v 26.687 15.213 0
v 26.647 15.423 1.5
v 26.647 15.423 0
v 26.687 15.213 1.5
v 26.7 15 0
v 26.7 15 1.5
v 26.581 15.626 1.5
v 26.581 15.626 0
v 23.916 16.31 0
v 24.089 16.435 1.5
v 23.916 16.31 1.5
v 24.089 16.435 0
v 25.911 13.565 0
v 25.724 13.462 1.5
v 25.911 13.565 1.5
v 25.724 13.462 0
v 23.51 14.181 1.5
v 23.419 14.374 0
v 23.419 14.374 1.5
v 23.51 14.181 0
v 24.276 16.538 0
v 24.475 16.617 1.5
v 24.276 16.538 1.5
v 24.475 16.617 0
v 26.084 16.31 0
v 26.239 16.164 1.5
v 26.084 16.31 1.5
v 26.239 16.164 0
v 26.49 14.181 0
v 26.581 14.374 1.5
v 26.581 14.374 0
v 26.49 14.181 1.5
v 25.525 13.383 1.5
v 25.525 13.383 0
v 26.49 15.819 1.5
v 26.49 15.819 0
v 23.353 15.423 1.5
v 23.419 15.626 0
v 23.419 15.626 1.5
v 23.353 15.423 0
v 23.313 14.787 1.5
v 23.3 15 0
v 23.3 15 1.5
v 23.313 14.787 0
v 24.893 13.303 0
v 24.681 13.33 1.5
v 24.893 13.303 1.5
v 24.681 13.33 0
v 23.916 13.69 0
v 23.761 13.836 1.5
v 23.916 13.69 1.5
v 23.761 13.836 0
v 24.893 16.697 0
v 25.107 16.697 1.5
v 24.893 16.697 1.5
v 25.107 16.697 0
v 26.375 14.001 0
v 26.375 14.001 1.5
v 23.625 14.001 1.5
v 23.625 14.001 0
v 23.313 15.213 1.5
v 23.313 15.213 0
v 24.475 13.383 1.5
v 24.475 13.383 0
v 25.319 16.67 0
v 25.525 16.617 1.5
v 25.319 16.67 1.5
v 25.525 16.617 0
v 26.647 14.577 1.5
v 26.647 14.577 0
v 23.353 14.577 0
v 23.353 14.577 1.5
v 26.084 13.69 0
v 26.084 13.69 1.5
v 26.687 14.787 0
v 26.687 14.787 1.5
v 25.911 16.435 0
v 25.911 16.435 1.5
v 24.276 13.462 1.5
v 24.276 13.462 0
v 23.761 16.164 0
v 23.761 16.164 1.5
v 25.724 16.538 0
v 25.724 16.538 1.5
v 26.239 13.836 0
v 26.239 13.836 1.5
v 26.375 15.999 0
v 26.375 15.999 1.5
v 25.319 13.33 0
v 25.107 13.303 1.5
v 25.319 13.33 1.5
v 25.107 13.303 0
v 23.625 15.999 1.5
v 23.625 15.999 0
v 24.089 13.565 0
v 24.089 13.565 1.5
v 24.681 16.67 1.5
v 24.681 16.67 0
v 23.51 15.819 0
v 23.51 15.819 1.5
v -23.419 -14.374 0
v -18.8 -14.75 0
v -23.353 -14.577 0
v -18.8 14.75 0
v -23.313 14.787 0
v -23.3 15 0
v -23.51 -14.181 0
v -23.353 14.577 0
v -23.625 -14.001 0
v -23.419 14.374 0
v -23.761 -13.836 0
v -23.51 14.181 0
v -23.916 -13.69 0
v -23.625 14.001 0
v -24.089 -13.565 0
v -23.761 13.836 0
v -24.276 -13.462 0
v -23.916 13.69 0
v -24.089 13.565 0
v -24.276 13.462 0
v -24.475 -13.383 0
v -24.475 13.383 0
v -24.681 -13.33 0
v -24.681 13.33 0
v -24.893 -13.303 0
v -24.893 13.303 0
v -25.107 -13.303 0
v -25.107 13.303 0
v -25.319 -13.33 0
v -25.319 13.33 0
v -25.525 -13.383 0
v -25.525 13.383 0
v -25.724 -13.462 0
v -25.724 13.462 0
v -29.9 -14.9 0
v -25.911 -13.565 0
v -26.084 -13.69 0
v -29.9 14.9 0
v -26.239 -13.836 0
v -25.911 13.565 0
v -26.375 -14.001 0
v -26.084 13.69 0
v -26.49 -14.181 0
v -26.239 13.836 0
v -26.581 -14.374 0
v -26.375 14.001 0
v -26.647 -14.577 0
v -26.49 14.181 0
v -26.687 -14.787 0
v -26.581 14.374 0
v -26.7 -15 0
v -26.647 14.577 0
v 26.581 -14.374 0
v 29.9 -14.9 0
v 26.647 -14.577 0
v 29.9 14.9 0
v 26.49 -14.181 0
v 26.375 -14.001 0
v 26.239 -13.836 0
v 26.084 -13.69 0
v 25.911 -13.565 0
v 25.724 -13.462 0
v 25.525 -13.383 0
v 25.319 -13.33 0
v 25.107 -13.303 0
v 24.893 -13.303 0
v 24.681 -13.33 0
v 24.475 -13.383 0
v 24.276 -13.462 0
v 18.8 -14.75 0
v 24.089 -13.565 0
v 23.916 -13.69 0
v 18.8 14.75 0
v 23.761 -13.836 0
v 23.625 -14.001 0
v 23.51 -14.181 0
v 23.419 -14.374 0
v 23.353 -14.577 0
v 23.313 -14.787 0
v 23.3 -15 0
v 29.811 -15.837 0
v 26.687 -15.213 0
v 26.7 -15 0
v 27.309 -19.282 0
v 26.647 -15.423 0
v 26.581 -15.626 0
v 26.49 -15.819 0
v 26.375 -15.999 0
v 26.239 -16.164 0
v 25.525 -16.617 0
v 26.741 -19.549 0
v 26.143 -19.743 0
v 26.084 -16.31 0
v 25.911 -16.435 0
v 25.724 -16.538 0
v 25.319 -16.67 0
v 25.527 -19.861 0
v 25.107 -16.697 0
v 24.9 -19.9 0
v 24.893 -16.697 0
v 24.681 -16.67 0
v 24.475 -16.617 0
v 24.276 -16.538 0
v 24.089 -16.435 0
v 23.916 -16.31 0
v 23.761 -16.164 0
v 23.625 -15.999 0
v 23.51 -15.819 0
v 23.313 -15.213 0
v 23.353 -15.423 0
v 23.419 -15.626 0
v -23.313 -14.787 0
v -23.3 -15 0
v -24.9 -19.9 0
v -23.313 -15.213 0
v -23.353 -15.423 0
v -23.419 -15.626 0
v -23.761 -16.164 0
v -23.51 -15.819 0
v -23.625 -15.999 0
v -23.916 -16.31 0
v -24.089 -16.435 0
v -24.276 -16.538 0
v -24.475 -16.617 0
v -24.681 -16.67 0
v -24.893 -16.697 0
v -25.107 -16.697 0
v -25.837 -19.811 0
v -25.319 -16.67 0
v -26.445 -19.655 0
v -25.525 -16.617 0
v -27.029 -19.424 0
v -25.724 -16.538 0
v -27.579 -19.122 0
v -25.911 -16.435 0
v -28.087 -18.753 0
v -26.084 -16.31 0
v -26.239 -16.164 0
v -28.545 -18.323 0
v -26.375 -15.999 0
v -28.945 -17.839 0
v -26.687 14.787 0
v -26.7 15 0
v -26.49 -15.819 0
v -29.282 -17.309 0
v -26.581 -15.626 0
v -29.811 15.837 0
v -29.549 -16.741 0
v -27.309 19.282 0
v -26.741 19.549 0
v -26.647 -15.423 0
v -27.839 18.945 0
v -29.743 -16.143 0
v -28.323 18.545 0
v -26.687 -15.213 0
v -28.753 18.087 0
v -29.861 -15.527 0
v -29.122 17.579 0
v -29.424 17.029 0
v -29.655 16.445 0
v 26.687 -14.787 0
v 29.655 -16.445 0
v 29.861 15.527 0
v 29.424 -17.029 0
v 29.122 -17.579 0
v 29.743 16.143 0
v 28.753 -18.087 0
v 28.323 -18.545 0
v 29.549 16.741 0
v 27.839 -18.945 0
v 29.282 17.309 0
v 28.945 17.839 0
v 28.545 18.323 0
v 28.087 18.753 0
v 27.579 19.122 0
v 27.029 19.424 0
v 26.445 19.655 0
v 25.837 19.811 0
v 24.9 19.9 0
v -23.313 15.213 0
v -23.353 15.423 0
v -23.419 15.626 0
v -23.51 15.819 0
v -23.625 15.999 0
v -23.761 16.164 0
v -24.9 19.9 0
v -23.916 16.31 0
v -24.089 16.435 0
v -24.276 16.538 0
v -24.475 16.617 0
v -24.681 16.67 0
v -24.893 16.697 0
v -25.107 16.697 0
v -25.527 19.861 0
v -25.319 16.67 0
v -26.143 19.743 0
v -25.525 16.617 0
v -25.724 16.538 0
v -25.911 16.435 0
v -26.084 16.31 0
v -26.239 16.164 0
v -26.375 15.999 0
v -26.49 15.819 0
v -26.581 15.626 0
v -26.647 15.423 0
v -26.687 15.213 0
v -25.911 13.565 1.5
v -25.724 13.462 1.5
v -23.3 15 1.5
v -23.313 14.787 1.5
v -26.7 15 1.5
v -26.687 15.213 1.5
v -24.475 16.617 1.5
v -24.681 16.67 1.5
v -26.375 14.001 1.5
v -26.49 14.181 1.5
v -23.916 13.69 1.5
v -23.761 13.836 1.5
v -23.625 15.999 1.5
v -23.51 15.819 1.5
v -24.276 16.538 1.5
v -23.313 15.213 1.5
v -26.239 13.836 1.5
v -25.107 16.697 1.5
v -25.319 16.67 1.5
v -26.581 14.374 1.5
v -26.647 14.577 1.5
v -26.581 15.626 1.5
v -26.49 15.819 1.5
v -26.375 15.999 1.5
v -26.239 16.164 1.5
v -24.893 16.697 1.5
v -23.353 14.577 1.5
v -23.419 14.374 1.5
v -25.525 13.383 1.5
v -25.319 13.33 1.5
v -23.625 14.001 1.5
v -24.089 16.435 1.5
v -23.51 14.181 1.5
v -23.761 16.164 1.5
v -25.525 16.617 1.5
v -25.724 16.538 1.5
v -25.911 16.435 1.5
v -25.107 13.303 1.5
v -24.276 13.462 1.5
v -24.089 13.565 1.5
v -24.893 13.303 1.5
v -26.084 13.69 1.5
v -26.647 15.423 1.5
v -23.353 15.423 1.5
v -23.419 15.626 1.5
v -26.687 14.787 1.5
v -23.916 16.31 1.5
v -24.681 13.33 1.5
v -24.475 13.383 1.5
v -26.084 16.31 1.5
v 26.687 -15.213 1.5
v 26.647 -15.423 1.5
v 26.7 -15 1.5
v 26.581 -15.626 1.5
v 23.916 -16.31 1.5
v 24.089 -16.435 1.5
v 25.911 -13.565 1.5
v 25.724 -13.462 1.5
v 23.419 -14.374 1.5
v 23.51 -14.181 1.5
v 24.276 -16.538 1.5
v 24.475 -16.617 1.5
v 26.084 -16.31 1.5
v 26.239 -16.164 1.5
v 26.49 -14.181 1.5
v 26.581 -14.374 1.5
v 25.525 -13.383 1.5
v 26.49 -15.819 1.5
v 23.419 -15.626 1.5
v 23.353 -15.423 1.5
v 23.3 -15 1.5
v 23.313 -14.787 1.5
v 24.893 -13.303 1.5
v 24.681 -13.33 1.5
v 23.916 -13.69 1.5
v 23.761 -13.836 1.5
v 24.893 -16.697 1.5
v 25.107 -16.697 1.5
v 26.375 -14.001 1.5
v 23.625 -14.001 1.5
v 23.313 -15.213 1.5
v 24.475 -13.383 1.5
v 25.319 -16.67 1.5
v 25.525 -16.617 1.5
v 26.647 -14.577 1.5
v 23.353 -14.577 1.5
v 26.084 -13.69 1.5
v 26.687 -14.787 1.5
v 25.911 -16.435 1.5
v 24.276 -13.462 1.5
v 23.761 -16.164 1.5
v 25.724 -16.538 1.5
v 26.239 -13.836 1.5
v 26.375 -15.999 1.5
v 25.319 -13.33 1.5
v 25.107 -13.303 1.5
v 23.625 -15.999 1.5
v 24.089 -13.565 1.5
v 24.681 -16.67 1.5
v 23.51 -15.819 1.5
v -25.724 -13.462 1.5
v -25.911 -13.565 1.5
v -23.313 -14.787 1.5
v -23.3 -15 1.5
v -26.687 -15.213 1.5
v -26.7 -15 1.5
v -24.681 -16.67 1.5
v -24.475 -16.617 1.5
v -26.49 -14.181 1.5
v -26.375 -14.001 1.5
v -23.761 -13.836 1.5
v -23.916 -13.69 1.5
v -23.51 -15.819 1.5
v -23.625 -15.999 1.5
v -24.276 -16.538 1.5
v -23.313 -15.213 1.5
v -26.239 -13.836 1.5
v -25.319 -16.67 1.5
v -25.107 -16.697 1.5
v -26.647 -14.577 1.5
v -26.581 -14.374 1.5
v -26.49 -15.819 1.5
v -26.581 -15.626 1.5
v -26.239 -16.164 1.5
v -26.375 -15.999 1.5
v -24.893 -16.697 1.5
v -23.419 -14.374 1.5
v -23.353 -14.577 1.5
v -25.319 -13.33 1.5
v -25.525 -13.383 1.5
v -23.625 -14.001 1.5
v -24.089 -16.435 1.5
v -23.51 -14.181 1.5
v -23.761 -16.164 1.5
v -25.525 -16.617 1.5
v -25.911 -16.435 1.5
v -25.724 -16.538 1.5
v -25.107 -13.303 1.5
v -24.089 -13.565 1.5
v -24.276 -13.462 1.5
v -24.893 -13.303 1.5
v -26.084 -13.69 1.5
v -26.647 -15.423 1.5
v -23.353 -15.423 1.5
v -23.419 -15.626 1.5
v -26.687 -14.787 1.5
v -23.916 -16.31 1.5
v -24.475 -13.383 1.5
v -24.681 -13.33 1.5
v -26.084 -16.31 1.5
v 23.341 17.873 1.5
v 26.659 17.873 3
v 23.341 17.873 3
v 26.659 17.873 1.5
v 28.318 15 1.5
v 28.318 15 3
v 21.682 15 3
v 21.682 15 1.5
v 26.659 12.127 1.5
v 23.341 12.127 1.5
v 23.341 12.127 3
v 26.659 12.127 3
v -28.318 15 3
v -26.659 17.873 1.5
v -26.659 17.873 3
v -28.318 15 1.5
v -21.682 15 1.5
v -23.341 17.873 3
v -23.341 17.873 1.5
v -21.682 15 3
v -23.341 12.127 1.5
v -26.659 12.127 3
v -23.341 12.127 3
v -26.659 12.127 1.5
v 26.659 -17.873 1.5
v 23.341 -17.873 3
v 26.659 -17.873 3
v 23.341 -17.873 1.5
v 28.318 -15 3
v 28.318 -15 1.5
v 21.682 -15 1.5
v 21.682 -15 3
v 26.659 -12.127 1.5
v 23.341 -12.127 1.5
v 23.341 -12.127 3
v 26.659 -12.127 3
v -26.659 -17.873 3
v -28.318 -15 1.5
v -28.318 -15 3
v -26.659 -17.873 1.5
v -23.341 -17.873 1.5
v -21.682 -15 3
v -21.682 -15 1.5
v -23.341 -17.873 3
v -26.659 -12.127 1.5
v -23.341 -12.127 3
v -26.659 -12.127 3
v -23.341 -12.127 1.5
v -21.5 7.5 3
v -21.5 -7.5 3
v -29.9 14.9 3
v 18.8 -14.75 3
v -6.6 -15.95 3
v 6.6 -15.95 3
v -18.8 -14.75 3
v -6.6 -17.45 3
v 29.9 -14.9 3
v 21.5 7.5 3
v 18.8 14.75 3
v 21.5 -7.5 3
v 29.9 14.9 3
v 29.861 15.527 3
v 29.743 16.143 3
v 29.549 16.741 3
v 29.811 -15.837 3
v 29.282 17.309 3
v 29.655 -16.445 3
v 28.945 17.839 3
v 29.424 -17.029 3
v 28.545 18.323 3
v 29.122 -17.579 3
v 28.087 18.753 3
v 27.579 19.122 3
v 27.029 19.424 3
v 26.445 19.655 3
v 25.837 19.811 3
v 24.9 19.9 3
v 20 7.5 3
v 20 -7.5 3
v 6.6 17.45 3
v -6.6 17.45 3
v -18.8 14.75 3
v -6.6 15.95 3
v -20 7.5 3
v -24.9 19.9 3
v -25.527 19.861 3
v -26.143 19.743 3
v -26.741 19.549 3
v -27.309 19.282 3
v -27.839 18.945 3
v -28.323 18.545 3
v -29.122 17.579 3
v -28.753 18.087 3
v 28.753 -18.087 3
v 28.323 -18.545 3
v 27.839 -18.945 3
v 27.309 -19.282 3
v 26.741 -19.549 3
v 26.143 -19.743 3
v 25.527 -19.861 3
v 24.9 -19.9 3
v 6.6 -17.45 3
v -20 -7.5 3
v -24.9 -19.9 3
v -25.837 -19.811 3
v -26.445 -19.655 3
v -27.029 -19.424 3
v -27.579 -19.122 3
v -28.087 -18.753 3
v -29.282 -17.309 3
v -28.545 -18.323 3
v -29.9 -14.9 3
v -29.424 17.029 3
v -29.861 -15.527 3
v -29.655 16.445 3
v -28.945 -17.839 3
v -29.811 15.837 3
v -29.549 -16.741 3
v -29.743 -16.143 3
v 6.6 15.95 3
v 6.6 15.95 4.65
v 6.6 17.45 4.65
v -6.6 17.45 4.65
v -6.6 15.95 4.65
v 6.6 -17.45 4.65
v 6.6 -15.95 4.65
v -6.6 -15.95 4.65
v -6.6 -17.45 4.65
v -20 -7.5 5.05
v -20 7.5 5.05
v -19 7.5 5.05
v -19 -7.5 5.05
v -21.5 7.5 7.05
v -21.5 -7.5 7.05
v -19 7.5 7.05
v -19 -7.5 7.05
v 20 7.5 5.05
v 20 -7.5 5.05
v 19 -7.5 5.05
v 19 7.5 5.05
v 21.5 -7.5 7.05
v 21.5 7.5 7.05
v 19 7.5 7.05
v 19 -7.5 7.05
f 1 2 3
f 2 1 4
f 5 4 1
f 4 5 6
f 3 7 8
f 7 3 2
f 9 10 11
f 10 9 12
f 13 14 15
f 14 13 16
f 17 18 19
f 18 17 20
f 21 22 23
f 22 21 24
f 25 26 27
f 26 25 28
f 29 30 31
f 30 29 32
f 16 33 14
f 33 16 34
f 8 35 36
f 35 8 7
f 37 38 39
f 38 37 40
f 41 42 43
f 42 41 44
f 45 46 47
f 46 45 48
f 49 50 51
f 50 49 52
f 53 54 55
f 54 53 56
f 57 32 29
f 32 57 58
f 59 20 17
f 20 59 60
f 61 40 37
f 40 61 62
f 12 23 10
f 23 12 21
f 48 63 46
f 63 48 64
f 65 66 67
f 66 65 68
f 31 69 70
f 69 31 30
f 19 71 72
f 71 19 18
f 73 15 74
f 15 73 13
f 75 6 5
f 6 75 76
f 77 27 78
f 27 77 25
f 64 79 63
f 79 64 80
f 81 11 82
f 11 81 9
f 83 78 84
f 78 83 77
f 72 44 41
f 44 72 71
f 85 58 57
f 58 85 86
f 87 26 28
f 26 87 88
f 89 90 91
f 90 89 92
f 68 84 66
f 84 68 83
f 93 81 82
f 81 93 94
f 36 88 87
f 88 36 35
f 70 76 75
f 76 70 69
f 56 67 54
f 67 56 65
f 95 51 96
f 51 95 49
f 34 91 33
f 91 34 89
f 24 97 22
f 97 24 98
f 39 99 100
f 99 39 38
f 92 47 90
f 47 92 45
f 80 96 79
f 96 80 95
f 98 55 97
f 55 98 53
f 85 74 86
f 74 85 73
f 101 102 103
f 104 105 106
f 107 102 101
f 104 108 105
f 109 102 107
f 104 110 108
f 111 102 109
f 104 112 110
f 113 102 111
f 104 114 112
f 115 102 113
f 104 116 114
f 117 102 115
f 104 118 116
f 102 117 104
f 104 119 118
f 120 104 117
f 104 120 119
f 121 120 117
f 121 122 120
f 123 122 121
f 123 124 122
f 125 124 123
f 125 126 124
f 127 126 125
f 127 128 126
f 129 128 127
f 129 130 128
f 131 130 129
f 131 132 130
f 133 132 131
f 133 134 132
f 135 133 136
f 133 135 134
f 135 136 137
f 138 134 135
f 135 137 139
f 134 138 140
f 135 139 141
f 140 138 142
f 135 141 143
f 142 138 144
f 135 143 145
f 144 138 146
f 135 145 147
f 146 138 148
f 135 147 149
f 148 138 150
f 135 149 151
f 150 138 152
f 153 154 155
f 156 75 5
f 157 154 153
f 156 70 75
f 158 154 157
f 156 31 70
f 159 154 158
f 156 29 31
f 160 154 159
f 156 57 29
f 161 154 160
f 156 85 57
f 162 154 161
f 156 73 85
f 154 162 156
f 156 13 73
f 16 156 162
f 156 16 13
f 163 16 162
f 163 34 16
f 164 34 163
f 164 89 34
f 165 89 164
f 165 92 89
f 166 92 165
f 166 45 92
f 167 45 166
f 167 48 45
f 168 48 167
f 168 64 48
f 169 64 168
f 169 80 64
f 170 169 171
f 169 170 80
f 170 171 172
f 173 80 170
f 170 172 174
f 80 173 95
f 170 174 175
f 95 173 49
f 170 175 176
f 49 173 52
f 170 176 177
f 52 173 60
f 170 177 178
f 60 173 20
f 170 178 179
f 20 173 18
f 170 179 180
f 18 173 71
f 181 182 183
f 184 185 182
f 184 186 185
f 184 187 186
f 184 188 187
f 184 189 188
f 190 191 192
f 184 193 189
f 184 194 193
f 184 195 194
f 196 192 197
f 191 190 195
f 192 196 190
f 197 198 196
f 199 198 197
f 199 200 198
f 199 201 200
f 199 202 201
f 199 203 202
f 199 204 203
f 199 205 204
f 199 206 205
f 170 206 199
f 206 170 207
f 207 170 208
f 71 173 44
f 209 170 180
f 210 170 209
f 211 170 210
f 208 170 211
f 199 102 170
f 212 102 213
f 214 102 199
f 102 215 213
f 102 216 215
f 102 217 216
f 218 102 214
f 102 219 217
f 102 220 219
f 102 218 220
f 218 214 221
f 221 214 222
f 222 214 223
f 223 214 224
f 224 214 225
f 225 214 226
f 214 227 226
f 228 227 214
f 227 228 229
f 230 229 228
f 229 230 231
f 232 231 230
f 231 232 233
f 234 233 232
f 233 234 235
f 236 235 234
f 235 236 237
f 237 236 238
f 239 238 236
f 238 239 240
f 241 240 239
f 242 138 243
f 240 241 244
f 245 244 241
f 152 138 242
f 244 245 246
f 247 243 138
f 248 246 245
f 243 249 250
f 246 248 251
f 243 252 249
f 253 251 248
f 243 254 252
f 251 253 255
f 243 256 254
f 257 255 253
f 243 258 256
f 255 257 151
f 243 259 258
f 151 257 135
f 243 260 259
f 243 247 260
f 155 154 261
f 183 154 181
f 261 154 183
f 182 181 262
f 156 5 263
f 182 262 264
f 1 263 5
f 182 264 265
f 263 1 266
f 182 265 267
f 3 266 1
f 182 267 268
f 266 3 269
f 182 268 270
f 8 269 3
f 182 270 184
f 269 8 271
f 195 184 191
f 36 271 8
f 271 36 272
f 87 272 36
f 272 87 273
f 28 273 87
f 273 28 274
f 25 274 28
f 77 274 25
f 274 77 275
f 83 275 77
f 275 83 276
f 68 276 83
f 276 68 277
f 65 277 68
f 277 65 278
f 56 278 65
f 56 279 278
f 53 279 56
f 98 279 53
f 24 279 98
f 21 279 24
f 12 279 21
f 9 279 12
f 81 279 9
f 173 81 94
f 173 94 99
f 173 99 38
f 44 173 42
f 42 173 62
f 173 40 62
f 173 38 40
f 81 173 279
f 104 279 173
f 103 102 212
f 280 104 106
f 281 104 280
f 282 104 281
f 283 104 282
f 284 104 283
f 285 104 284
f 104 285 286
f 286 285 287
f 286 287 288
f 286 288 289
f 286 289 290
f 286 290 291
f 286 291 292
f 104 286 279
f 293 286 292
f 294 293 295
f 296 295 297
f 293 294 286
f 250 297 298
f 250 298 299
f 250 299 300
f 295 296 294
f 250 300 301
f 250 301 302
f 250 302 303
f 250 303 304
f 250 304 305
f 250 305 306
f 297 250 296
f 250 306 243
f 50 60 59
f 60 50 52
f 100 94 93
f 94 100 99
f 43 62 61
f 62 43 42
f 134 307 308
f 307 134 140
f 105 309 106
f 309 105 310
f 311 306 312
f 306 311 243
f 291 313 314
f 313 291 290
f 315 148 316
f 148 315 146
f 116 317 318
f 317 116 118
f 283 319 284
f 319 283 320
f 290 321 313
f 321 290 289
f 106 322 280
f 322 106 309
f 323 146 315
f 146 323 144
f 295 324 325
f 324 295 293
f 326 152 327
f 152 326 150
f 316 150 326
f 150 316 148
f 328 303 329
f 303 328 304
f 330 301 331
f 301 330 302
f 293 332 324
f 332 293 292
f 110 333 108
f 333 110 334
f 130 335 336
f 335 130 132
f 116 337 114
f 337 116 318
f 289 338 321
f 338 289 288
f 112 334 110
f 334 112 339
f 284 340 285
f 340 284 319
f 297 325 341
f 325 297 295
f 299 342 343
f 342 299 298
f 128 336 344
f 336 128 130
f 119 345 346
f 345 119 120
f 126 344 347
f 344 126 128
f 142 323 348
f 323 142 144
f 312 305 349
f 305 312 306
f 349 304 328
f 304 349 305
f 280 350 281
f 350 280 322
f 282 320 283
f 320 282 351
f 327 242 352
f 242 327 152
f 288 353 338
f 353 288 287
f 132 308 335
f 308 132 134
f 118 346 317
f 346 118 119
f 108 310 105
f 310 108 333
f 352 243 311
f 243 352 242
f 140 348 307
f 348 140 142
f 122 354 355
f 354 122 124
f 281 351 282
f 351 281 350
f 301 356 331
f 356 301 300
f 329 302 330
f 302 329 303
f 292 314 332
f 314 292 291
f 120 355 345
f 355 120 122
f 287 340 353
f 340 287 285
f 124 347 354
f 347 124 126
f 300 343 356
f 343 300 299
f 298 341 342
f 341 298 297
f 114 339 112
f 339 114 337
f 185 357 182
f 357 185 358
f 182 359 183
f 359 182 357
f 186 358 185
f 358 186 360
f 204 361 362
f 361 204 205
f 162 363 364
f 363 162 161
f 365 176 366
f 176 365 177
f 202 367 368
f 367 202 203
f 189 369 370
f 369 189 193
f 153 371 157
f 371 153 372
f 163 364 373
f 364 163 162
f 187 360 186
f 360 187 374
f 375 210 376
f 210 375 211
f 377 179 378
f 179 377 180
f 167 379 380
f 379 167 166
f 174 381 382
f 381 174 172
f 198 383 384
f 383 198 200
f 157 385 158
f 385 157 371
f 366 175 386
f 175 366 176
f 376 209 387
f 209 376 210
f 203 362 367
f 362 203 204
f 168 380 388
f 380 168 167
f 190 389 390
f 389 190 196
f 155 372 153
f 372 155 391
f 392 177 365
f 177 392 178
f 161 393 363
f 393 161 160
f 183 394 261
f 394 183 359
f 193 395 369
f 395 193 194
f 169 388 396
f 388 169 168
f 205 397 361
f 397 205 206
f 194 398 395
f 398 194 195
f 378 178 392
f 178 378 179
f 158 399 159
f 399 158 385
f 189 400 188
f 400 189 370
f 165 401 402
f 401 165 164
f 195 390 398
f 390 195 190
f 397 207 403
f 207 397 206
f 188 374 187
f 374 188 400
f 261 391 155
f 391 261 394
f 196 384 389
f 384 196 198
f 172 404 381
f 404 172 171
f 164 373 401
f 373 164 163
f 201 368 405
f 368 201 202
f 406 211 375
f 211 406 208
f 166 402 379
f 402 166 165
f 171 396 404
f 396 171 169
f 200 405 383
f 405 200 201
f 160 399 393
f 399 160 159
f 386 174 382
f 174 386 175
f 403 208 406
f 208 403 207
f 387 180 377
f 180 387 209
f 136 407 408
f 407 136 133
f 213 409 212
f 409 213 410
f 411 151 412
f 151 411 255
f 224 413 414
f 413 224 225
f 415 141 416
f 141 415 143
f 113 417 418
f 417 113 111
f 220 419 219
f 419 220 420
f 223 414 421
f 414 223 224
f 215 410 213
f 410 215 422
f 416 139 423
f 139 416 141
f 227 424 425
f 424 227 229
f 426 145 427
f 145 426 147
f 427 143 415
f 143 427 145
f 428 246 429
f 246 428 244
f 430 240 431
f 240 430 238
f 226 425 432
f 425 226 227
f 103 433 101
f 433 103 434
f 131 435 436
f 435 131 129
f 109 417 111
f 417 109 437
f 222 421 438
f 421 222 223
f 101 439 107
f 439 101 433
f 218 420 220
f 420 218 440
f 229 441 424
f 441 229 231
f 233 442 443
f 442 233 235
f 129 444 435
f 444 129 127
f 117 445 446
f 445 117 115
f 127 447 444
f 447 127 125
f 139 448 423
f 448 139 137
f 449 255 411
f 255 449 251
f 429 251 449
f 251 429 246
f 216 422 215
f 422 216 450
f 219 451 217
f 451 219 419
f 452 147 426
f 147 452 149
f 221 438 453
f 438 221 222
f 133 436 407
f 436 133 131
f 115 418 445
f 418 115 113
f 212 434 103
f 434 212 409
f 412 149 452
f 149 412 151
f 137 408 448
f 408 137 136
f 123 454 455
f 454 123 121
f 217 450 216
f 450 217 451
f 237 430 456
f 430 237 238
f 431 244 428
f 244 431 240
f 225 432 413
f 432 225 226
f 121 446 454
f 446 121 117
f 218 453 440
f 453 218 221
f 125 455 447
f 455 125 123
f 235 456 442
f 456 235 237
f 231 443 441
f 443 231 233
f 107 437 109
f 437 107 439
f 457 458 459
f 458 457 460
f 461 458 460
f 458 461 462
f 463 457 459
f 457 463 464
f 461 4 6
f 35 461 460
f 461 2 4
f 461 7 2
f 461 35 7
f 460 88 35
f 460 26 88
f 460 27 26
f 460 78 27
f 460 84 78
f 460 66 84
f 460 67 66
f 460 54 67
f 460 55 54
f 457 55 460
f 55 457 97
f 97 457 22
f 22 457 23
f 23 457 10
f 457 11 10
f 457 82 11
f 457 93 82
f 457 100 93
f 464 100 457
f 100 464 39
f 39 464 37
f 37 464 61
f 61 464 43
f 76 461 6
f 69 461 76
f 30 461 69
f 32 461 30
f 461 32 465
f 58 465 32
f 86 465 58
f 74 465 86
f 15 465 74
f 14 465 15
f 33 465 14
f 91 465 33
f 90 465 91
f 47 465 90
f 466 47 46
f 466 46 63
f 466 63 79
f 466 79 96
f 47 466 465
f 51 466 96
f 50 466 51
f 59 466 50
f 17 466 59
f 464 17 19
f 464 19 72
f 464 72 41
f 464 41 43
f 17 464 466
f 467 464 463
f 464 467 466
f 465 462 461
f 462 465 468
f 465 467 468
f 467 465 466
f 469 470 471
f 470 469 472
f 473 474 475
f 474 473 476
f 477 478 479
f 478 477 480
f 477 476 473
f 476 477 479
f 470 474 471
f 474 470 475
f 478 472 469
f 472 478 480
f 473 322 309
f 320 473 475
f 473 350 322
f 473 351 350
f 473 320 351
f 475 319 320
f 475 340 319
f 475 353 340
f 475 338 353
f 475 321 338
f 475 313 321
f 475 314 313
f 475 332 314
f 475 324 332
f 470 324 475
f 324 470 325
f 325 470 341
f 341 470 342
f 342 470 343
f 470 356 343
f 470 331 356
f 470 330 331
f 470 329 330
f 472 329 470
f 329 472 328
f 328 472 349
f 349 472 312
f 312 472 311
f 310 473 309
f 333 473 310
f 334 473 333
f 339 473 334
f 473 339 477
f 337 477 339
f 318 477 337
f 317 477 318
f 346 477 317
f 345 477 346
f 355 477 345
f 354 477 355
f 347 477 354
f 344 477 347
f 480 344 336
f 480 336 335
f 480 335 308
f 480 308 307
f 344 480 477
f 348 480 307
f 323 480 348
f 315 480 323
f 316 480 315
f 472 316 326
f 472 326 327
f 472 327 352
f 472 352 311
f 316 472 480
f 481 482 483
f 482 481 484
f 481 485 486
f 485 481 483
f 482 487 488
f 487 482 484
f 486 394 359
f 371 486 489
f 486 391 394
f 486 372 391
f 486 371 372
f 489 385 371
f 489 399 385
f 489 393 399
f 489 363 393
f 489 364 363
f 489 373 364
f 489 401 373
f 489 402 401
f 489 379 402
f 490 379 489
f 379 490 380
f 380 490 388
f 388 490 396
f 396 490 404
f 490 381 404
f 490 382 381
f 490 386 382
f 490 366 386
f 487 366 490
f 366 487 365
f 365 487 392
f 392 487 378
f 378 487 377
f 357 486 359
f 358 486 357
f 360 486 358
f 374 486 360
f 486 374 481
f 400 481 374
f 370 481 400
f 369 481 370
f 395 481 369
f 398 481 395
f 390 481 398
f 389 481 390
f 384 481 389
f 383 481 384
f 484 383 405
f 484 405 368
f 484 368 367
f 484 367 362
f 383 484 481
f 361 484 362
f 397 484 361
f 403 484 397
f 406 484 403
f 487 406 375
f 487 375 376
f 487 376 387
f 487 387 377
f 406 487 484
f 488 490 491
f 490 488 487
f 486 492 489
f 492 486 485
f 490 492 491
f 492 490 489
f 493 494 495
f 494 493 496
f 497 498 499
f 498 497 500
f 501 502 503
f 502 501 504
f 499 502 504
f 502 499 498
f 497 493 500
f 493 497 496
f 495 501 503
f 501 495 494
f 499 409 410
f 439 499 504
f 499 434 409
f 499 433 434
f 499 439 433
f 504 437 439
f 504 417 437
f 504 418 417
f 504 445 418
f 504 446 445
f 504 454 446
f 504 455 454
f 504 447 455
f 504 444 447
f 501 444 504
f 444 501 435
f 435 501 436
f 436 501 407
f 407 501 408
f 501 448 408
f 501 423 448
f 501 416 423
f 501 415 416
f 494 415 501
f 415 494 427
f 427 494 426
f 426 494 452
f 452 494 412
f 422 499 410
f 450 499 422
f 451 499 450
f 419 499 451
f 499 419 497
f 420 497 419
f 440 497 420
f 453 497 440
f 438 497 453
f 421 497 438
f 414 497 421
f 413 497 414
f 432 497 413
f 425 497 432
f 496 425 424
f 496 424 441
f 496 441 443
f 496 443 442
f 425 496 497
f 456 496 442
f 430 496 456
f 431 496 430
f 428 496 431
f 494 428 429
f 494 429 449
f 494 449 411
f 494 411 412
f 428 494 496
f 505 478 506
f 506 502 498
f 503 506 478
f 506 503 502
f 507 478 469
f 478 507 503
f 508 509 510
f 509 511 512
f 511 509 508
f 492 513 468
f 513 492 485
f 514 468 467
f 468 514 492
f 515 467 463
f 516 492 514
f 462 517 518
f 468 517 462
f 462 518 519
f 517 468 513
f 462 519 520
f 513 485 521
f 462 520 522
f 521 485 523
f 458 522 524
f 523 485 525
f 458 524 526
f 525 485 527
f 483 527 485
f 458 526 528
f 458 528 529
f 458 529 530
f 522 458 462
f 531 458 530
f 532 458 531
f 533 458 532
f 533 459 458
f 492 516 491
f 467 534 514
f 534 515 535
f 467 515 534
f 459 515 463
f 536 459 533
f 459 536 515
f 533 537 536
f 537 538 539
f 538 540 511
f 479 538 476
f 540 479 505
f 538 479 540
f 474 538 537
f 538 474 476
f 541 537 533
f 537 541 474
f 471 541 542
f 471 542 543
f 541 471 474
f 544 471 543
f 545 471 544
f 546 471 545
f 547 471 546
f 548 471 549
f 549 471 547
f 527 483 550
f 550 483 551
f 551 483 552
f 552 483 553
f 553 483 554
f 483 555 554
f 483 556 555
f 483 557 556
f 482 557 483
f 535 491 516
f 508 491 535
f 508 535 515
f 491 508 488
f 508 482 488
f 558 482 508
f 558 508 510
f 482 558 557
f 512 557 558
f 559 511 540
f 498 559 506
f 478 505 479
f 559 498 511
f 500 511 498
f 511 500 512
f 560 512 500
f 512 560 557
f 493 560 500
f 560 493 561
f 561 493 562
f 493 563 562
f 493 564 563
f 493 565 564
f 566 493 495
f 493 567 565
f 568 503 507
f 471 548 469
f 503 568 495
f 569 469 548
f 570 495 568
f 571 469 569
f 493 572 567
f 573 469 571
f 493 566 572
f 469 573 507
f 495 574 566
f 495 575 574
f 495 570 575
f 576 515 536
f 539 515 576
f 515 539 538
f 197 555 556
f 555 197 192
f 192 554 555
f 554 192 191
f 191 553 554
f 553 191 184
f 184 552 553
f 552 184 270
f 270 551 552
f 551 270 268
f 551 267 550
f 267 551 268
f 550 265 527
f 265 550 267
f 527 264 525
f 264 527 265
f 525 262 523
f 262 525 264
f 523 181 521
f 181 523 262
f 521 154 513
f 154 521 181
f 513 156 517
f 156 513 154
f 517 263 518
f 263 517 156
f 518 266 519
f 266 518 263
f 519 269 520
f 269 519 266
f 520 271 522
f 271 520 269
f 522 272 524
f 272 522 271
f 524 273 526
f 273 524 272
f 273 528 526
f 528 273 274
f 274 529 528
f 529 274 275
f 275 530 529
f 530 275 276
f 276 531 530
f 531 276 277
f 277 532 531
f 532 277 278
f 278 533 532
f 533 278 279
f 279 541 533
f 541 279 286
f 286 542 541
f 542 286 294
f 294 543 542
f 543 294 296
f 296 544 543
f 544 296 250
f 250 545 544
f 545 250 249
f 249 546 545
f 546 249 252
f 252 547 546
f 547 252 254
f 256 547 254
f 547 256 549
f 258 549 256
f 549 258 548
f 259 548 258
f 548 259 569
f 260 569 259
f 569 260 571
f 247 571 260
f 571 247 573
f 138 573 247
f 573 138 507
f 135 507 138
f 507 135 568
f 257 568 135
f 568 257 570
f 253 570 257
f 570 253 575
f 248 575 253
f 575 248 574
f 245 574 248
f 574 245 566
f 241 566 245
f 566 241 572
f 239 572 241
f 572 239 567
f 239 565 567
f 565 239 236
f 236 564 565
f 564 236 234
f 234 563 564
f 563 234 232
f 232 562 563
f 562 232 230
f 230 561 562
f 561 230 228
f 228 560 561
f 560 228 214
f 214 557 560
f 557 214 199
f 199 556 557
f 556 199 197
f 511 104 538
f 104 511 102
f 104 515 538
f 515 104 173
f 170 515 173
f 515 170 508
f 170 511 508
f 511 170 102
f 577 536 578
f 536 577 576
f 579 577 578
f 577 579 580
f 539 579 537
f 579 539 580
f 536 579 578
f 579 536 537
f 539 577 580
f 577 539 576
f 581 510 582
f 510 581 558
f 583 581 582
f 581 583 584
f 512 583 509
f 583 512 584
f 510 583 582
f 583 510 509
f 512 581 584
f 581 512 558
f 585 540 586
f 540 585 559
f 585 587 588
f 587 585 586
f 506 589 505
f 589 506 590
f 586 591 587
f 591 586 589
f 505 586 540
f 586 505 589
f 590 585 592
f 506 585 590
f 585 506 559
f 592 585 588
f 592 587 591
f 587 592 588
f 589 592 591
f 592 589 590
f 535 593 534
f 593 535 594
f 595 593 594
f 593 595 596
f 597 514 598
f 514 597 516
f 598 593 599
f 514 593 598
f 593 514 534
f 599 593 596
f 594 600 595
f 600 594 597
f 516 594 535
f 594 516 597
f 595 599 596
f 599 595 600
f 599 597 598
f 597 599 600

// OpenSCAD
/* [PCB selection - NOT WORKING YET] */
your_pcb="foo"; // [arduino_uno, arduino_mega, rp4]

////////////////////////////////////////////////////////////////////////////////
/* [Main parameters] */
grid_spacing = 10;

pcb_width=39.6;
pcb_depth = 31.5;
pcb_height = 1.65;

swap_tabs = false;
external_Ltabs = false;

////////////////////////////////////////////////////////////////////////////////
/* [Secondary parameters] */
hole_diam = 3; // for screw
nut_min_diam = 5.4; // for nuts
tolerance = 0.2; //used fo 3D printing
min_border = 1.5; //minimal dist. from nut to the outter border of the board
pcb_offset = 1; //protruding border below the pcb

////////////////////////////////////////////////////////////////////////////////
/* [Change at your own risks] */
fillet_radius = 5;
nut_max_diam = nut_min_diam*2/sqrt(3);
board_height = 3;
board_width_min = ceil(pcb_width+(nut_max_diam+tolerance*2+min_border)*2+min_border*2);
board_width = ceil(board_width_min/grid_spacing)*grid_spacing-tolerance;
holes_dist_width_min = ceil(pcb_width+(nut_max_diam+tolerance*2)+min_border*2);
holes_dist_width = ceil(holes_dist_width_min/grid_spacing)*grid_spacing;
board_depth_min = ceil(pcb_depth+min_border*2);
board_depth = ceil(board_depth_min/grid_spacing)*grid_spacing-tolerance;
holes_dist_depth_min = floor(pcb_depth-(nut_max_diam+tolerance*2)/2-min_border*2);
holes_dist_depth = ceil(holes_dist_depth_min/grid_spacing)*grid_spacing;


fixed_tab_length = 15;
tab_length = swap_tabs ? fixed_tab_length : pcb_width/3; //ok
L_tab_length = swap_tabs ? pcb_depth/3 : fixed_tab_length; // ok

//final_tab_length = external_Ltabs ?  pcb_width : tab_length;
final_L_tab_length = external_Ltabs ?  fixed_tab_length : L_tab_length;

//final_L_tab_length = swap_tabs ? pcb_depth/3 : L_tab_length;
//L_tab_length = board_depth/3;
L_hook = 1;

////////////////////////////////////////////////////////////////////////////////
/*Code*/

// Module for symmetry
module mirror_copy(v = [1, 0, 0]) {
    children();
    mirror(v) children();}

// Board with holes
difference(){
    // Create the board
    linear_extrude(height = board_height) {
        difference() {
            offset($fn=50, r = fillet_radius) {
                square([board_width-fillet_radius*2,board_depth-fillet_radius*2],center=true);}
                square([pcb_width-pcb_offset*2,pcb_depth-pcb_offset*2],center=true);}}
                // holes
                mirror_copy([0, 1, 0])
                mirror_copy()
                translate([holes_dist_width/2,holes_dist_depth/2,0]){
                    cylinder($fn=50, h=board_height*2, r=hole_diam/2+tolerance);}
                    // nut holes
                    mirror_copy([0, 1, 0])
                    mirror_copy()
                    translate([holes_dist_width/2,holes_dist_depth/2,board_height/2]){
                        cylinder($fn=6, h=board_height*2, r=(nut_max_diam/2+tolerance));}}

                          
if (swap_tabs){
//simple tabs
mirror_copy([0, 1, 0])
translate([-tab_length/2,pcb_depth/2+tolerance,board_height]){
cube([tab_length, 1.5, pcb_height+tolerance*2], center=false);
    //translate([0,0,pcb_height+tolerance*2]){
    translate([0,-L_hook,pcb_height+tolerance*2]){
        cube([ tab_length,1.5+L_hook, 2]);
        }
}
//L tabs
mirror_copy([1, 0, 0])
translate([-pcb_width/2-tolerance-1.5,-final_L_tab_length/2,board_height]){
    cube([1.5, final_L_tab_length, pcb_height]);
        }

        }

else {
mirror_copy([0, 1, 0])
translate([-tab_length/2,pcb_depth/2+tolerance,board_height]){
cube([tab_length, 1.5, pcb_height], center=false);}
//L tabs
mirror_copy([1, 0, 0])
translate([-pcb_width/2-tolerance-1.5,-final_L_tab_length/2,board_height]){
    cube([1.5, final_L_tab_length, pcb_height+tolerance*2]);
    translate([0,0,pcb_height+tolerance*2]){
        cube([1.5+L_hook, final_L_tab_length, 2]);}}
}
// THE END
 
